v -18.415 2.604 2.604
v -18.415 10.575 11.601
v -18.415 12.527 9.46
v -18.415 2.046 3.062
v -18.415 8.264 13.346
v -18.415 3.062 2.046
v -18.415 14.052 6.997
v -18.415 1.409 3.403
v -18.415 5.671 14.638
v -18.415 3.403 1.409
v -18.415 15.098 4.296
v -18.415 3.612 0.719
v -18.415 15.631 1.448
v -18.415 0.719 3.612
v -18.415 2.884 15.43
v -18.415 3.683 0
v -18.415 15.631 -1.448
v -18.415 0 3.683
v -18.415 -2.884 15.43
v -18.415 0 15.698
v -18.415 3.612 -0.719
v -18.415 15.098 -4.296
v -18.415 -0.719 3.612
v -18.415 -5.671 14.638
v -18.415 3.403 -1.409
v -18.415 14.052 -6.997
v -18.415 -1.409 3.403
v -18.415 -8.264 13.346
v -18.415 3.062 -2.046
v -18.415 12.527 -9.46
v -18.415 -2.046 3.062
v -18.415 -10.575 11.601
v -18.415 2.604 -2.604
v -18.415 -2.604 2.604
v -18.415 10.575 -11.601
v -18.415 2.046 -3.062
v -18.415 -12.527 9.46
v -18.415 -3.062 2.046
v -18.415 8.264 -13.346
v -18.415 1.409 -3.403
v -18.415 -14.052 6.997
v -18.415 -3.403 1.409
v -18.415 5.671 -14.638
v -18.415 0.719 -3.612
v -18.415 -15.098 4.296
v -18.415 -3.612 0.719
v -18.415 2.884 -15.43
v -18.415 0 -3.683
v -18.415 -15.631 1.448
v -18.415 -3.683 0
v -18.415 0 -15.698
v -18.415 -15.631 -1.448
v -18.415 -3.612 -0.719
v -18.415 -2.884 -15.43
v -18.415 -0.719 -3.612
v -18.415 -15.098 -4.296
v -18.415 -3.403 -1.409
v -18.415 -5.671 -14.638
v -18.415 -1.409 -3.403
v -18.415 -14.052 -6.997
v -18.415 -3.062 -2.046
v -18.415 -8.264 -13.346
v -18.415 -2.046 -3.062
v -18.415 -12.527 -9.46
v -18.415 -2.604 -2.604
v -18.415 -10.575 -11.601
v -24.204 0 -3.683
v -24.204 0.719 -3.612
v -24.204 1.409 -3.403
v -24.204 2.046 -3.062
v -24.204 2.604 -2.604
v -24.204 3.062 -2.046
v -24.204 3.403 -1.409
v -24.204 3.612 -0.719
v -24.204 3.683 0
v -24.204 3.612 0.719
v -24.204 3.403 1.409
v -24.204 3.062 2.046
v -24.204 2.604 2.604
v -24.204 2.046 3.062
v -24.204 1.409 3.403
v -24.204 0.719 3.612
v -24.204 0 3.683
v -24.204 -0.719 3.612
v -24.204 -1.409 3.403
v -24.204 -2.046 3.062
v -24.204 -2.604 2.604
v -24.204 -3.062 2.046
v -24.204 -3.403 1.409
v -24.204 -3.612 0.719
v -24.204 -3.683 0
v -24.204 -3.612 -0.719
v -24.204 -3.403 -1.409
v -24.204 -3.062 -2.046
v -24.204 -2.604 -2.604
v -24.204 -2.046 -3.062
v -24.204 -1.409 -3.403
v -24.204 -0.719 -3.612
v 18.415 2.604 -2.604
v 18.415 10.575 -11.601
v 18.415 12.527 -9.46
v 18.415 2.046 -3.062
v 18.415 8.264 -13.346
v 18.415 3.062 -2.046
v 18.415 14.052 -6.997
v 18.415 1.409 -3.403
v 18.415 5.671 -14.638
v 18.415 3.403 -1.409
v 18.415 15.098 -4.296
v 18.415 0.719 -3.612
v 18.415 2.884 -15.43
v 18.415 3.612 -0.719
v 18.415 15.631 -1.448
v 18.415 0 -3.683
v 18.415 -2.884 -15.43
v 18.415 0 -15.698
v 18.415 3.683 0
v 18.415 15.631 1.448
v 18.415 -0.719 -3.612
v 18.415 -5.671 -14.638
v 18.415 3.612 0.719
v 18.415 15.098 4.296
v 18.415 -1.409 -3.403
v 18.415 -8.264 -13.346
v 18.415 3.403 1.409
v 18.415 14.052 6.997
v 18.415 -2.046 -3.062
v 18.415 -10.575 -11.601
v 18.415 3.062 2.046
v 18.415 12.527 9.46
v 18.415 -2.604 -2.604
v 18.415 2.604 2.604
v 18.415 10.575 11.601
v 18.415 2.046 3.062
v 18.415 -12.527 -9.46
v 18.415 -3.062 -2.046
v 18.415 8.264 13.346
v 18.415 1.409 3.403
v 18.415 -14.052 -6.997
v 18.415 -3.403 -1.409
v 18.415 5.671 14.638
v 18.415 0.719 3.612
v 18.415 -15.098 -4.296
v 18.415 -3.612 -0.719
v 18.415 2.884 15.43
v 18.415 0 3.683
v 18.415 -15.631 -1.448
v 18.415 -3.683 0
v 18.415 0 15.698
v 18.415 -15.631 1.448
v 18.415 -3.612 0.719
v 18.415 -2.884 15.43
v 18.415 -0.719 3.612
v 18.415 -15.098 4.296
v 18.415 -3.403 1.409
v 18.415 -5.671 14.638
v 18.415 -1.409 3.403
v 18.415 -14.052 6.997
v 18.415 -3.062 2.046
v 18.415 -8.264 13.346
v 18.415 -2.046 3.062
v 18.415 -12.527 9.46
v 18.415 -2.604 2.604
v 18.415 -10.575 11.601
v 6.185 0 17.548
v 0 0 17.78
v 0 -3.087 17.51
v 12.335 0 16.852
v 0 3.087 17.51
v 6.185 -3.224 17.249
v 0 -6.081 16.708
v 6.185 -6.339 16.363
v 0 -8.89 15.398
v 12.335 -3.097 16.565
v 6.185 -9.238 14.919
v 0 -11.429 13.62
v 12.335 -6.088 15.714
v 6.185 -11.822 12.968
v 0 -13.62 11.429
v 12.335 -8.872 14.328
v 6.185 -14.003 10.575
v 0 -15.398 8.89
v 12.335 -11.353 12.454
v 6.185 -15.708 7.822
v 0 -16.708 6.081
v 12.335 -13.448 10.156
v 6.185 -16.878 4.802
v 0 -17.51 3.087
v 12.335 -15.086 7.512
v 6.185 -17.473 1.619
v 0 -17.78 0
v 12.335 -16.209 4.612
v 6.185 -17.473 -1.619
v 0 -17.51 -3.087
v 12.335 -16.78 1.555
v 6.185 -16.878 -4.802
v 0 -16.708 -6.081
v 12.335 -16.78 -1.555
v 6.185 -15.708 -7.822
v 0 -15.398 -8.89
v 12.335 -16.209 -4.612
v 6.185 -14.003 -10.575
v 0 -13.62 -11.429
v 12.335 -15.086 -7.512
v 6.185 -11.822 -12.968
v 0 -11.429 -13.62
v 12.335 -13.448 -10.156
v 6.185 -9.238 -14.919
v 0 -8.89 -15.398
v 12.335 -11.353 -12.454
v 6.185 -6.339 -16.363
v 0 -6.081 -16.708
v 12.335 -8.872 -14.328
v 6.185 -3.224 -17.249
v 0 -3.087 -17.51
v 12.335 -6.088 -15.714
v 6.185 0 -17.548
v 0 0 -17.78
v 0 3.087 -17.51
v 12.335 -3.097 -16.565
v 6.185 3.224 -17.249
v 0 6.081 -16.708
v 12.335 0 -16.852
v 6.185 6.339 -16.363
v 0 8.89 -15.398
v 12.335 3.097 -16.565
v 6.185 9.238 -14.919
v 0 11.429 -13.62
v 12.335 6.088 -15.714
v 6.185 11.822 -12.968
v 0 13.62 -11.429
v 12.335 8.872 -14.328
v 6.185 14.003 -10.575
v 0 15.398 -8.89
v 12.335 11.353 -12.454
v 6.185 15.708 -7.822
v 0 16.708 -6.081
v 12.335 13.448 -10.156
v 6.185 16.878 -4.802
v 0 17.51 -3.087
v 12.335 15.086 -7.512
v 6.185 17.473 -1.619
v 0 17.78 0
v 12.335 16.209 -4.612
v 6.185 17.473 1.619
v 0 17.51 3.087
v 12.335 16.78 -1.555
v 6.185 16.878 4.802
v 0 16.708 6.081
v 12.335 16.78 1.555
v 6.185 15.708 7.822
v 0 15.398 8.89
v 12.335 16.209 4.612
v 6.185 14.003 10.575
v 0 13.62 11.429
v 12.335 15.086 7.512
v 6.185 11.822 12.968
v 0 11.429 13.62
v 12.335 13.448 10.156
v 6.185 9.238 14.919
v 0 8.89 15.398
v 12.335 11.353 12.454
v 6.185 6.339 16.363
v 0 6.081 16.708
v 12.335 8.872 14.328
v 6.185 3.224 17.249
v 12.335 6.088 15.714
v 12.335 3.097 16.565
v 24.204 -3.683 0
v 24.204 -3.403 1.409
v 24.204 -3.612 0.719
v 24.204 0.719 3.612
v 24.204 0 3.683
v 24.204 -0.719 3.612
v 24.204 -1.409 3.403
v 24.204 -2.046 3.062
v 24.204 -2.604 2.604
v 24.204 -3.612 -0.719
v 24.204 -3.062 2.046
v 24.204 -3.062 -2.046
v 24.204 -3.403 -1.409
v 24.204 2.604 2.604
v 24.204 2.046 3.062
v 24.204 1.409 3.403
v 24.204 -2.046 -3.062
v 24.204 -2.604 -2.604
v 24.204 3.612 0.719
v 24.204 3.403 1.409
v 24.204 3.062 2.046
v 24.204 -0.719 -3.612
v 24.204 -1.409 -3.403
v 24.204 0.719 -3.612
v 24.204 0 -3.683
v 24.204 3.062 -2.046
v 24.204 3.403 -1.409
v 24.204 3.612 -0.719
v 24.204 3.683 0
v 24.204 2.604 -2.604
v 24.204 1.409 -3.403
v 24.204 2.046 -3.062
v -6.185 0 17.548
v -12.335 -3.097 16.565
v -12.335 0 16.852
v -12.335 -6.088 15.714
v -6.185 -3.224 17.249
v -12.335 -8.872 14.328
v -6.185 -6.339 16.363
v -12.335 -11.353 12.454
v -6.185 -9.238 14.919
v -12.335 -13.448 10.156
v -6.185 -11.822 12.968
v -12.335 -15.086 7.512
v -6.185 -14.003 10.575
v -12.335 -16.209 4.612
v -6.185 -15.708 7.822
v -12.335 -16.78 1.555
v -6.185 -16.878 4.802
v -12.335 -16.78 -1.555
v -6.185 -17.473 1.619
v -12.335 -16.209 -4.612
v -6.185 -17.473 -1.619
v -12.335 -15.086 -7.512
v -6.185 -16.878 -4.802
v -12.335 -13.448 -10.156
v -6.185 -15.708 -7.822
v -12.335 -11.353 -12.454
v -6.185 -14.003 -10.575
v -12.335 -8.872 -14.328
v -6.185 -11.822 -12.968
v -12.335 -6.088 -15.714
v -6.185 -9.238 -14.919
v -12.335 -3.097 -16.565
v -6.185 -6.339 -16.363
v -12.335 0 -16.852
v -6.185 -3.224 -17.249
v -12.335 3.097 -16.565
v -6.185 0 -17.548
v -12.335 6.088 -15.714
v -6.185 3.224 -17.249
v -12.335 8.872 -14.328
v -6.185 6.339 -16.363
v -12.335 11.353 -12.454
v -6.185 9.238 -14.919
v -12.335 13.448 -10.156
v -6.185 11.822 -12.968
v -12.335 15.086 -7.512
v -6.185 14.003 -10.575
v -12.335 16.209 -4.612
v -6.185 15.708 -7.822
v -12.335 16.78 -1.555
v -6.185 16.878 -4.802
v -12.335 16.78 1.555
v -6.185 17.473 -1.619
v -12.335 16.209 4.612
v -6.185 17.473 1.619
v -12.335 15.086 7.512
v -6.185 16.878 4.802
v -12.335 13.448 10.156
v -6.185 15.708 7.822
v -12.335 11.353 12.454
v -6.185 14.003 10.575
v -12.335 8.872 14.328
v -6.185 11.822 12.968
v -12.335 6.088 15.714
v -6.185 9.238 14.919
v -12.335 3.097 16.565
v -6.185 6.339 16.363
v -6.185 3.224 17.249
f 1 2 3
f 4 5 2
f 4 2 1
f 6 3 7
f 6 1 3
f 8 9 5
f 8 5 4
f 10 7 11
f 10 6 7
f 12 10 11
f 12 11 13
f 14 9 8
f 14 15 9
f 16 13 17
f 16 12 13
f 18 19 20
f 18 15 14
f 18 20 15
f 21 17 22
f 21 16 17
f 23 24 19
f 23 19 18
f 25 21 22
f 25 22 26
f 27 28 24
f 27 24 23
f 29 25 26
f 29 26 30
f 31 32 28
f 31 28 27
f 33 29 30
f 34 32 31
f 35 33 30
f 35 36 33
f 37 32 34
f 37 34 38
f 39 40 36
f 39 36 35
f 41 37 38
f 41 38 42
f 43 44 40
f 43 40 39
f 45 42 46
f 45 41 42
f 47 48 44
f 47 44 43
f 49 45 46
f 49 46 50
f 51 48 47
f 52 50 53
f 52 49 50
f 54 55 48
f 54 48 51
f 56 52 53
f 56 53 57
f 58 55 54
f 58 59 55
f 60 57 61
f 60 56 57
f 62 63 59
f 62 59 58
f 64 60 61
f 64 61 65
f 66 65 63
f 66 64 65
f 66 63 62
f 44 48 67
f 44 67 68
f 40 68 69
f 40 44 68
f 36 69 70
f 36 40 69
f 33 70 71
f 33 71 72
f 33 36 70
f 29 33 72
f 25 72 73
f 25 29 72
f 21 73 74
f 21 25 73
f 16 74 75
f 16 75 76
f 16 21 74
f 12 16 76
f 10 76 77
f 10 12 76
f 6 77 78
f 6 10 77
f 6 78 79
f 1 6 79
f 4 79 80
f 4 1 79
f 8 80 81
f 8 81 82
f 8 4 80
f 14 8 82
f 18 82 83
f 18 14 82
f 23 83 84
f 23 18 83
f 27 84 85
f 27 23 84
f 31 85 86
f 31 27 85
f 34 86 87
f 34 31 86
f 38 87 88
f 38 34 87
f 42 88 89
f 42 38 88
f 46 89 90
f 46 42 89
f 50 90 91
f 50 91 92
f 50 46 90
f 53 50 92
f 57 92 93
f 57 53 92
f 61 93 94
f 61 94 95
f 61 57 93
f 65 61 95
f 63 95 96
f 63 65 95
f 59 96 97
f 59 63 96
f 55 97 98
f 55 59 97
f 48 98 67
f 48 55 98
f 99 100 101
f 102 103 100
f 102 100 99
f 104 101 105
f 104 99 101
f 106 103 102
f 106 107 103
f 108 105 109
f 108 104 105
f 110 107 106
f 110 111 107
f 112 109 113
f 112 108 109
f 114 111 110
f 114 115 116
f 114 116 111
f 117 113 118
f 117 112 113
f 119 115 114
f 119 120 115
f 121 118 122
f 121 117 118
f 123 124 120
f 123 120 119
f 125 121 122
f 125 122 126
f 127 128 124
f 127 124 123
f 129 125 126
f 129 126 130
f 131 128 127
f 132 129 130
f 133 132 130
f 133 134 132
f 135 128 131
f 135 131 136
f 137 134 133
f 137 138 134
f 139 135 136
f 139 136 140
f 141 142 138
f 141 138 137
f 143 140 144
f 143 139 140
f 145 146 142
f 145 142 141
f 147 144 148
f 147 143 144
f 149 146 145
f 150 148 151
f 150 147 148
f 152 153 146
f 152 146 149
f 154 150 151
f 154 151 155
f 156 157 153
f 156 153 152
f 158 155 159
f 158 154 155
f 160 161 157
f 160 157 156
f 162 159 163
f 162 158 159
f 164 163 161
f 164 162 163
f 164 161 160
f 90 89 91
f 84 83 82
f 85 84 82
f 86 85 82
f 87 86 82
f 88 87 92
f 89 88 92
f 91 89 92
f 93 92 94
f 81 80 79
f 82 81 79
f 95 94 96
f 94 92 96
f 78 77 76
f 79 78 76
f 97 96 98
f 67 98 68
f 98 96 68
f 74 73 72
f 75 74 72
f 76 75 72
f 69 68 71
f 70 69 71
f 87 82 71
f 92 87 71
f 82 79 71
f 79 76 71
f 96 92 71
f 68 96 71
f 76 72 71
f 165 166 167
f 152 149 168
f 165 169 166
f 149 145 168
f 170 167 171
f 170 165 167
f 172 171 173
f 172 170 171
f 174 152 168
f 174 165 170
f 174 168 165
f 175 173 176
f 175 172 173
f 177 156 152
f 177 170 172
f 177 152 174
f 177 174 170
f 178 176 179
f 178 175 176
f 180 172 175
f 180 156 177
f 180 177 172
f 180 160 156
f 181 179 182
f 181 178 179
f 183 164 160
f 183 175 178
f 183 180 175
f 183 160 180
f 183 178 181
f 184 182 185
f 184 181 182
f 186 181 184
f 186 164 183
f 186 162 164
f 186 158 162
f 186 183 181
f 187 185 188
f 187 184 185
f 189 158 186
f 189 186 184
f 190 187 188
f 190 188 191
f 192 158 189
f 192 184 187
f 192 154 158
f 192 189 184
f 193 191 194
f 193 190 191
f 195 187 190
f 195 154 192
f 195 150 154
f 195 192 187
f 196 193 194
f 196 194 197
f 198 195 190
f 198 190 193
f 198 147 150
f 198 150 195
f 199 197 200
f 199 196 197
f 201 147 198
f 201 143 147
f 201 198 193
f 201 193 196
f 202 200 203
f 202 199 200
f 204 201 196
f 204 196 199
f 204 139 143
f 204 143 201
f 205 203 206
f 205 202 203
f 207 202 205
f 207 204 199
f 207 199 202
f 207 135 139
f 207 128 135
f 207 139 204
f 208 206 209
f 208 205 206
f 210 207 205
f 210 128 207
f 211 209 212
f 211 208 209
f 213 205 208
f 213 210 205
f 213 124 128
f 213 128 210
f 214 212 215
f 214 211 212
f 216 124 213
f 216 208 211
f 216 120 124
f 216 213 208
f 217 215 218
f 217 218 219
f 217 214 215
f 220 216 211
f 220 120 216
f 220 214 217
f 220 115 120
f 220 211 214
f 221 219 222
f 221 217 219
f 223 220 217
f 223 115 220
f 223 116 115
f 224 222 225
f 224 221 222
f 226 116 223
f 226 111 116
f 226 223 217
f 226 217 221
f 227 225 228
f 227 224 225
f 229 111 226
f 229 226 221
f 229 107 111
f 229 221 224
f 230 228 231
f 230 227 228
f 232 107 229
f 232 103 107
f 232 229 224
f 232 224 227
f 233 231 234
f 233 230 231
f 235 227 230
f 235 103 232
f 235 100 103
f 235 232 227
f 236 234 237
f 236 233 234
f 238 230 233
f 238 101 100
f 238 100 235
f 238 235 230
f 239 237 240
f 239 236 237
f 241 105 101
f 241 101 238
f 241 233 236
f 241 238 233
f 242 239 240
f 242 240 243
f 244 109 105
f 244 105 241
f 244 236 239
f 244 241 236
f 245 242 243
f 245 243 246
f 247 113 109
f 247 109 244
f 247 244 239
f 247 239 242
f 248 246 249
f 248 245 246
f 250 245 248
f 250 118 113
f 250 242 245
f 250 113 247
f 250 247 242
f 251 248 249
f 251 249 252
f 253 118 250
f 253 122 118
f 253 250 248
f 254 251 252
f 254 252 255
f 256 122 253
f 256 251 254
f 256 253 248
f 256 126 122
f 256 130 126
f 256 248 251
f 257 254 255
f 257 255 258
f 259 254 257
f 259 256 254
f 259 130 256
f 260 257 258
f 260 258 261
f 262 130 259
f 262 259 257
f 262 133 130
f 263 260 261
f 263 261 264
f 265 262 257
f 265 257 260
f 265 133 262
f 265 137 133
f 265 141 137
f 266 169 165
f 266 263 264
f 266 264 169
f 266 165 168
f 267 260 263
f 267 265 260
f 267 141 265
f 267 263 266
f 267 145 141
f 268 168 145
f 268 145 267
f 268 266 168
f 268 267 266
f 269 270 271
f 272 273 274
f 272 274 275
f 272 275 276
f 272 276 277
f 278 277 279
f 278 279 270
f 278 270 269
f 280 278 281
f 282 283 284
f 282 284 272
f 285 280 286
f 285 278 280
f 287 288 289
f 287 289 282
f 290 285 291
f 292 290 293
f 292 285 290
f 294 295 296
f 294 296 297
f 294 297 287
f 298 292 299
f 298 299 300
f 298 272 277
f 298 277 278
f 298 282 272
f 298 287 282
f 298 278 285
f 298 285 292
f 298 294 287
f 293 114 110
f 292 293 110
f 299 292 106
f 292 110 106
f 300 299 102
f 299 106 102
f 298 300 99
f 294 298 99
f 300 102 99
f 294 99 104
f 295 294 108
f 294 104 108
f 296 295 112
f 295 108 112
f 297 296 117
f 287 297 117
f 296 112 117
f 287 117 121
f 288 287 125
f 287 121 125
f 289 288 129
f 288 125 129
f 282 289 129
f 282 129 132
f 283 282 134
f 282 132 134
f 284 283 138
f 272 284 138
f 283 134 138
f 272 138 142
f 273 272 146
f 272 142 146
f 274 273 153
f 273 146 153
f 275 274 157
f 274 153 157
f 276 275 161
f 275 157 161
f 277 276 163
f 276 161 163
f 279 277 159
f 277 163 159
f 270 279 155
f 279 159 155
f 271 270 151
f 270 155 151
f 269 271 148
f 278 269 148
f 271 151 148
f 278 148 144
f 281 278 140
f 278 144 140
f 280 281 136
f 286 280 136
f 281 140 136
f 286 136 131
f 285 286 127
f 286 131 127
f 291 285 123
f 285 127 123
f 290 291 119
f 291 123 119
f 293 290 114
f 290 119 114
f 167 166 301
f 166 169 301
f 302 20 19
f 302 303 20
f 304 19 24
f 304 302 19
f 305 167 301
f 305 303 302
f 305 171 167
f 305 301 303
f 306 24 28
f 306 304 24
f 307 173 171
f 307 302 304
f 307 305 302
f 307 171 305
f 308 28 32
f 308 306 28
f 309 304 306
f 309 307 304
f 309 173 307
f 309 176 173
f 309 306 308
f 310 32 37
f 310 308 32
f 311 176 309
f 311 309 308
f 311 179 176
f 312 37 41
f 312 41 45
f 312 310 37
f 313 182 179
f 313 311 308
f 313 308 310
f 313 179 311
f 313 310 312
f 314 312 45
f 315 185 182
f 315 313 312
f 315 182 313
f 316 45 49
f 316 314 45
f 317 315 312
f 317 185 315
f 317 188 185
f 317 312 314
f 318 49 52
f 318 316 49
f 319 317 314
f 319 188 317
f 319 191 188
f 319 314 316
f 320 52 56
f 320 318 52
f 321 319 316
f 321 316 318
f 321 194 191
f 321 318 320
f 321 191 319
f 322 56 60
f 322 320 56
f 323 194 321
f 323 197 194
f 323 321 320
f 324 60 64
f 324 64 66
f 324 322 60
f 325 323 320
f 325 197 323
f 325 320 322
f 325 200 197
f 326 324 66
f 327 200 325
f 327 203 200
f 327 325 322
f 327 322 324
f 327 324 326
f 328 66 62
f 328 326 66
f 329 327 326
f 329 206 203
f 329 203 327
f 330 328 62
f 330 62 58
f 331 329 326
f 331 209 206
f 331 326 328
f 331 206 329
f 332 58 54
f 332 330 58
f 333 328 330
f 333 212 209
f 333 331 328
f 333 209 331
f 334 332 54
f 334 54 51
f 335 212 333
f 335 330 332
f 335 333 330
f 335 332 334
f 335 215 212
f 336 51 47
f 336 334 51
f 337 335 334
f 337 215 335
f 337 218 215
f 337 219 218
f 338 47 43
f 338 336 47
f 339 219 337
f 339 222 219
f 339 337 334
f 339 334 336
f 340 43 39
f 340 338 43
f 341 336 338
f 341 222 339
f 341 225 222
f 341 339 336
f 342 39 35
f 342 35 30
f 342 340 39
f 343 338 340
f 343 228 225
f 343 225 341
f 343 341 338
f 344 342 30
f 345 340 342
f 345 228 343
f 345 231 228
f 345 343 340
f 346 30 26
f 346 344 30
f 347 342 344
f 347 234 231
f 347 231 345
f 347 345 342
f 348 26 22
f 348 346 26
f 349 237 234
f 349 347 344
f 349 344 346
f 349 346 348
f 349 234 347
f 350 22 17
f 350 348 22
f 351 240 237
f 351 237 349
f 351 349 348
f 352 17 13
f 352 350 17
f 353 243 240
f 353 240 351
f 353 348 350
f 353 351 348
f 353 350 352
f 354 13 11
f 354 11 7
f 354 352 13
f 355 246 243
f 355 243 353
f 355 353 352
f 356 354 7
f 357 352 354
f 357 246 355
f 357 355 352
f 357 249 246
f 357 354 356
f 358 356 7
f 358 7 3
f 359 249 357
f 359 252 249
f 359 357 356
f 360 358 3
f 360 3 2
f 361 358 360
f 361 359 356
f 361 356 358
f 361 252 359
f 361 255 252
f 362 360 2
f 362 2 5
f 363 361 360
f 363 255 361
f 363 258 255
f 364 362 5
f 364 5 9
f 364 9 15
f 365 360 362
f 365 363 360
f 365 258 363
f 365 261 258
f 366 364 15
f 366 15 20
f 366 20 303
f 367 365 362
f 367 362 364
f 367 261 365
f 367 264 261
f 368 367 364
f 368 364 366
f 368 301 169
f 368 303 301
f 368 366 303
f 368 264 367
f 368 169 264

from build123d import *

# Parameters (mm, degrees)
SKETCH4_R           = 3.683
BOSS_EXTRUDE1_DEPTH = 5.789022458


with BuildPart() as part:
    # Sketch2 → Revolve1 (revolve)
    with BuildSketch(Plane.XY, mode=Mode.PRIVATE) as revolve1_sk:
        with BuildLine():
            Line((-18.415, 0), (-18.415, 15.697572511))
            ThreePointArc((-18.415, 15.697572511), (-9.266184884, 17.257739329), (0, 17.78))
            ThreePointArc((0, 17.78), (9.266184884, 17.257739329), (18.415, 15.697572511))
            Line((18.415, 15.697572511), (18.415, 0))
            Line((18.415, 0), (-18.415, 0))
        make_face()
    revolve(revolve1_sk.sketch.rotate(Axis((-18.415, 0, 0), (1, 0, 0)), 90), axis=Axis((-18.415, 0, 0), (1, 0, 0)))

    # Sketch4 → Boss-Extrude1 (add)
    with BuildSketch(Plane(origin=(18.415, 0, 0), x_dir=(0, 0, -1), z_dir=(1, 0, 0))):
        Circle(SKETCH4_R)
    boss_extrude1 = extrude(amount=BOSS_EXTRUDE1_DEPTH)

    # Mirror1: Boss-Extrude1 across plane
    add(boss_extrude1.mirror(Plane(origin=(0, 0, 0), x_dir=(0, 0, 1), z_dir=(1, 0, 0))))


solid = part.part
